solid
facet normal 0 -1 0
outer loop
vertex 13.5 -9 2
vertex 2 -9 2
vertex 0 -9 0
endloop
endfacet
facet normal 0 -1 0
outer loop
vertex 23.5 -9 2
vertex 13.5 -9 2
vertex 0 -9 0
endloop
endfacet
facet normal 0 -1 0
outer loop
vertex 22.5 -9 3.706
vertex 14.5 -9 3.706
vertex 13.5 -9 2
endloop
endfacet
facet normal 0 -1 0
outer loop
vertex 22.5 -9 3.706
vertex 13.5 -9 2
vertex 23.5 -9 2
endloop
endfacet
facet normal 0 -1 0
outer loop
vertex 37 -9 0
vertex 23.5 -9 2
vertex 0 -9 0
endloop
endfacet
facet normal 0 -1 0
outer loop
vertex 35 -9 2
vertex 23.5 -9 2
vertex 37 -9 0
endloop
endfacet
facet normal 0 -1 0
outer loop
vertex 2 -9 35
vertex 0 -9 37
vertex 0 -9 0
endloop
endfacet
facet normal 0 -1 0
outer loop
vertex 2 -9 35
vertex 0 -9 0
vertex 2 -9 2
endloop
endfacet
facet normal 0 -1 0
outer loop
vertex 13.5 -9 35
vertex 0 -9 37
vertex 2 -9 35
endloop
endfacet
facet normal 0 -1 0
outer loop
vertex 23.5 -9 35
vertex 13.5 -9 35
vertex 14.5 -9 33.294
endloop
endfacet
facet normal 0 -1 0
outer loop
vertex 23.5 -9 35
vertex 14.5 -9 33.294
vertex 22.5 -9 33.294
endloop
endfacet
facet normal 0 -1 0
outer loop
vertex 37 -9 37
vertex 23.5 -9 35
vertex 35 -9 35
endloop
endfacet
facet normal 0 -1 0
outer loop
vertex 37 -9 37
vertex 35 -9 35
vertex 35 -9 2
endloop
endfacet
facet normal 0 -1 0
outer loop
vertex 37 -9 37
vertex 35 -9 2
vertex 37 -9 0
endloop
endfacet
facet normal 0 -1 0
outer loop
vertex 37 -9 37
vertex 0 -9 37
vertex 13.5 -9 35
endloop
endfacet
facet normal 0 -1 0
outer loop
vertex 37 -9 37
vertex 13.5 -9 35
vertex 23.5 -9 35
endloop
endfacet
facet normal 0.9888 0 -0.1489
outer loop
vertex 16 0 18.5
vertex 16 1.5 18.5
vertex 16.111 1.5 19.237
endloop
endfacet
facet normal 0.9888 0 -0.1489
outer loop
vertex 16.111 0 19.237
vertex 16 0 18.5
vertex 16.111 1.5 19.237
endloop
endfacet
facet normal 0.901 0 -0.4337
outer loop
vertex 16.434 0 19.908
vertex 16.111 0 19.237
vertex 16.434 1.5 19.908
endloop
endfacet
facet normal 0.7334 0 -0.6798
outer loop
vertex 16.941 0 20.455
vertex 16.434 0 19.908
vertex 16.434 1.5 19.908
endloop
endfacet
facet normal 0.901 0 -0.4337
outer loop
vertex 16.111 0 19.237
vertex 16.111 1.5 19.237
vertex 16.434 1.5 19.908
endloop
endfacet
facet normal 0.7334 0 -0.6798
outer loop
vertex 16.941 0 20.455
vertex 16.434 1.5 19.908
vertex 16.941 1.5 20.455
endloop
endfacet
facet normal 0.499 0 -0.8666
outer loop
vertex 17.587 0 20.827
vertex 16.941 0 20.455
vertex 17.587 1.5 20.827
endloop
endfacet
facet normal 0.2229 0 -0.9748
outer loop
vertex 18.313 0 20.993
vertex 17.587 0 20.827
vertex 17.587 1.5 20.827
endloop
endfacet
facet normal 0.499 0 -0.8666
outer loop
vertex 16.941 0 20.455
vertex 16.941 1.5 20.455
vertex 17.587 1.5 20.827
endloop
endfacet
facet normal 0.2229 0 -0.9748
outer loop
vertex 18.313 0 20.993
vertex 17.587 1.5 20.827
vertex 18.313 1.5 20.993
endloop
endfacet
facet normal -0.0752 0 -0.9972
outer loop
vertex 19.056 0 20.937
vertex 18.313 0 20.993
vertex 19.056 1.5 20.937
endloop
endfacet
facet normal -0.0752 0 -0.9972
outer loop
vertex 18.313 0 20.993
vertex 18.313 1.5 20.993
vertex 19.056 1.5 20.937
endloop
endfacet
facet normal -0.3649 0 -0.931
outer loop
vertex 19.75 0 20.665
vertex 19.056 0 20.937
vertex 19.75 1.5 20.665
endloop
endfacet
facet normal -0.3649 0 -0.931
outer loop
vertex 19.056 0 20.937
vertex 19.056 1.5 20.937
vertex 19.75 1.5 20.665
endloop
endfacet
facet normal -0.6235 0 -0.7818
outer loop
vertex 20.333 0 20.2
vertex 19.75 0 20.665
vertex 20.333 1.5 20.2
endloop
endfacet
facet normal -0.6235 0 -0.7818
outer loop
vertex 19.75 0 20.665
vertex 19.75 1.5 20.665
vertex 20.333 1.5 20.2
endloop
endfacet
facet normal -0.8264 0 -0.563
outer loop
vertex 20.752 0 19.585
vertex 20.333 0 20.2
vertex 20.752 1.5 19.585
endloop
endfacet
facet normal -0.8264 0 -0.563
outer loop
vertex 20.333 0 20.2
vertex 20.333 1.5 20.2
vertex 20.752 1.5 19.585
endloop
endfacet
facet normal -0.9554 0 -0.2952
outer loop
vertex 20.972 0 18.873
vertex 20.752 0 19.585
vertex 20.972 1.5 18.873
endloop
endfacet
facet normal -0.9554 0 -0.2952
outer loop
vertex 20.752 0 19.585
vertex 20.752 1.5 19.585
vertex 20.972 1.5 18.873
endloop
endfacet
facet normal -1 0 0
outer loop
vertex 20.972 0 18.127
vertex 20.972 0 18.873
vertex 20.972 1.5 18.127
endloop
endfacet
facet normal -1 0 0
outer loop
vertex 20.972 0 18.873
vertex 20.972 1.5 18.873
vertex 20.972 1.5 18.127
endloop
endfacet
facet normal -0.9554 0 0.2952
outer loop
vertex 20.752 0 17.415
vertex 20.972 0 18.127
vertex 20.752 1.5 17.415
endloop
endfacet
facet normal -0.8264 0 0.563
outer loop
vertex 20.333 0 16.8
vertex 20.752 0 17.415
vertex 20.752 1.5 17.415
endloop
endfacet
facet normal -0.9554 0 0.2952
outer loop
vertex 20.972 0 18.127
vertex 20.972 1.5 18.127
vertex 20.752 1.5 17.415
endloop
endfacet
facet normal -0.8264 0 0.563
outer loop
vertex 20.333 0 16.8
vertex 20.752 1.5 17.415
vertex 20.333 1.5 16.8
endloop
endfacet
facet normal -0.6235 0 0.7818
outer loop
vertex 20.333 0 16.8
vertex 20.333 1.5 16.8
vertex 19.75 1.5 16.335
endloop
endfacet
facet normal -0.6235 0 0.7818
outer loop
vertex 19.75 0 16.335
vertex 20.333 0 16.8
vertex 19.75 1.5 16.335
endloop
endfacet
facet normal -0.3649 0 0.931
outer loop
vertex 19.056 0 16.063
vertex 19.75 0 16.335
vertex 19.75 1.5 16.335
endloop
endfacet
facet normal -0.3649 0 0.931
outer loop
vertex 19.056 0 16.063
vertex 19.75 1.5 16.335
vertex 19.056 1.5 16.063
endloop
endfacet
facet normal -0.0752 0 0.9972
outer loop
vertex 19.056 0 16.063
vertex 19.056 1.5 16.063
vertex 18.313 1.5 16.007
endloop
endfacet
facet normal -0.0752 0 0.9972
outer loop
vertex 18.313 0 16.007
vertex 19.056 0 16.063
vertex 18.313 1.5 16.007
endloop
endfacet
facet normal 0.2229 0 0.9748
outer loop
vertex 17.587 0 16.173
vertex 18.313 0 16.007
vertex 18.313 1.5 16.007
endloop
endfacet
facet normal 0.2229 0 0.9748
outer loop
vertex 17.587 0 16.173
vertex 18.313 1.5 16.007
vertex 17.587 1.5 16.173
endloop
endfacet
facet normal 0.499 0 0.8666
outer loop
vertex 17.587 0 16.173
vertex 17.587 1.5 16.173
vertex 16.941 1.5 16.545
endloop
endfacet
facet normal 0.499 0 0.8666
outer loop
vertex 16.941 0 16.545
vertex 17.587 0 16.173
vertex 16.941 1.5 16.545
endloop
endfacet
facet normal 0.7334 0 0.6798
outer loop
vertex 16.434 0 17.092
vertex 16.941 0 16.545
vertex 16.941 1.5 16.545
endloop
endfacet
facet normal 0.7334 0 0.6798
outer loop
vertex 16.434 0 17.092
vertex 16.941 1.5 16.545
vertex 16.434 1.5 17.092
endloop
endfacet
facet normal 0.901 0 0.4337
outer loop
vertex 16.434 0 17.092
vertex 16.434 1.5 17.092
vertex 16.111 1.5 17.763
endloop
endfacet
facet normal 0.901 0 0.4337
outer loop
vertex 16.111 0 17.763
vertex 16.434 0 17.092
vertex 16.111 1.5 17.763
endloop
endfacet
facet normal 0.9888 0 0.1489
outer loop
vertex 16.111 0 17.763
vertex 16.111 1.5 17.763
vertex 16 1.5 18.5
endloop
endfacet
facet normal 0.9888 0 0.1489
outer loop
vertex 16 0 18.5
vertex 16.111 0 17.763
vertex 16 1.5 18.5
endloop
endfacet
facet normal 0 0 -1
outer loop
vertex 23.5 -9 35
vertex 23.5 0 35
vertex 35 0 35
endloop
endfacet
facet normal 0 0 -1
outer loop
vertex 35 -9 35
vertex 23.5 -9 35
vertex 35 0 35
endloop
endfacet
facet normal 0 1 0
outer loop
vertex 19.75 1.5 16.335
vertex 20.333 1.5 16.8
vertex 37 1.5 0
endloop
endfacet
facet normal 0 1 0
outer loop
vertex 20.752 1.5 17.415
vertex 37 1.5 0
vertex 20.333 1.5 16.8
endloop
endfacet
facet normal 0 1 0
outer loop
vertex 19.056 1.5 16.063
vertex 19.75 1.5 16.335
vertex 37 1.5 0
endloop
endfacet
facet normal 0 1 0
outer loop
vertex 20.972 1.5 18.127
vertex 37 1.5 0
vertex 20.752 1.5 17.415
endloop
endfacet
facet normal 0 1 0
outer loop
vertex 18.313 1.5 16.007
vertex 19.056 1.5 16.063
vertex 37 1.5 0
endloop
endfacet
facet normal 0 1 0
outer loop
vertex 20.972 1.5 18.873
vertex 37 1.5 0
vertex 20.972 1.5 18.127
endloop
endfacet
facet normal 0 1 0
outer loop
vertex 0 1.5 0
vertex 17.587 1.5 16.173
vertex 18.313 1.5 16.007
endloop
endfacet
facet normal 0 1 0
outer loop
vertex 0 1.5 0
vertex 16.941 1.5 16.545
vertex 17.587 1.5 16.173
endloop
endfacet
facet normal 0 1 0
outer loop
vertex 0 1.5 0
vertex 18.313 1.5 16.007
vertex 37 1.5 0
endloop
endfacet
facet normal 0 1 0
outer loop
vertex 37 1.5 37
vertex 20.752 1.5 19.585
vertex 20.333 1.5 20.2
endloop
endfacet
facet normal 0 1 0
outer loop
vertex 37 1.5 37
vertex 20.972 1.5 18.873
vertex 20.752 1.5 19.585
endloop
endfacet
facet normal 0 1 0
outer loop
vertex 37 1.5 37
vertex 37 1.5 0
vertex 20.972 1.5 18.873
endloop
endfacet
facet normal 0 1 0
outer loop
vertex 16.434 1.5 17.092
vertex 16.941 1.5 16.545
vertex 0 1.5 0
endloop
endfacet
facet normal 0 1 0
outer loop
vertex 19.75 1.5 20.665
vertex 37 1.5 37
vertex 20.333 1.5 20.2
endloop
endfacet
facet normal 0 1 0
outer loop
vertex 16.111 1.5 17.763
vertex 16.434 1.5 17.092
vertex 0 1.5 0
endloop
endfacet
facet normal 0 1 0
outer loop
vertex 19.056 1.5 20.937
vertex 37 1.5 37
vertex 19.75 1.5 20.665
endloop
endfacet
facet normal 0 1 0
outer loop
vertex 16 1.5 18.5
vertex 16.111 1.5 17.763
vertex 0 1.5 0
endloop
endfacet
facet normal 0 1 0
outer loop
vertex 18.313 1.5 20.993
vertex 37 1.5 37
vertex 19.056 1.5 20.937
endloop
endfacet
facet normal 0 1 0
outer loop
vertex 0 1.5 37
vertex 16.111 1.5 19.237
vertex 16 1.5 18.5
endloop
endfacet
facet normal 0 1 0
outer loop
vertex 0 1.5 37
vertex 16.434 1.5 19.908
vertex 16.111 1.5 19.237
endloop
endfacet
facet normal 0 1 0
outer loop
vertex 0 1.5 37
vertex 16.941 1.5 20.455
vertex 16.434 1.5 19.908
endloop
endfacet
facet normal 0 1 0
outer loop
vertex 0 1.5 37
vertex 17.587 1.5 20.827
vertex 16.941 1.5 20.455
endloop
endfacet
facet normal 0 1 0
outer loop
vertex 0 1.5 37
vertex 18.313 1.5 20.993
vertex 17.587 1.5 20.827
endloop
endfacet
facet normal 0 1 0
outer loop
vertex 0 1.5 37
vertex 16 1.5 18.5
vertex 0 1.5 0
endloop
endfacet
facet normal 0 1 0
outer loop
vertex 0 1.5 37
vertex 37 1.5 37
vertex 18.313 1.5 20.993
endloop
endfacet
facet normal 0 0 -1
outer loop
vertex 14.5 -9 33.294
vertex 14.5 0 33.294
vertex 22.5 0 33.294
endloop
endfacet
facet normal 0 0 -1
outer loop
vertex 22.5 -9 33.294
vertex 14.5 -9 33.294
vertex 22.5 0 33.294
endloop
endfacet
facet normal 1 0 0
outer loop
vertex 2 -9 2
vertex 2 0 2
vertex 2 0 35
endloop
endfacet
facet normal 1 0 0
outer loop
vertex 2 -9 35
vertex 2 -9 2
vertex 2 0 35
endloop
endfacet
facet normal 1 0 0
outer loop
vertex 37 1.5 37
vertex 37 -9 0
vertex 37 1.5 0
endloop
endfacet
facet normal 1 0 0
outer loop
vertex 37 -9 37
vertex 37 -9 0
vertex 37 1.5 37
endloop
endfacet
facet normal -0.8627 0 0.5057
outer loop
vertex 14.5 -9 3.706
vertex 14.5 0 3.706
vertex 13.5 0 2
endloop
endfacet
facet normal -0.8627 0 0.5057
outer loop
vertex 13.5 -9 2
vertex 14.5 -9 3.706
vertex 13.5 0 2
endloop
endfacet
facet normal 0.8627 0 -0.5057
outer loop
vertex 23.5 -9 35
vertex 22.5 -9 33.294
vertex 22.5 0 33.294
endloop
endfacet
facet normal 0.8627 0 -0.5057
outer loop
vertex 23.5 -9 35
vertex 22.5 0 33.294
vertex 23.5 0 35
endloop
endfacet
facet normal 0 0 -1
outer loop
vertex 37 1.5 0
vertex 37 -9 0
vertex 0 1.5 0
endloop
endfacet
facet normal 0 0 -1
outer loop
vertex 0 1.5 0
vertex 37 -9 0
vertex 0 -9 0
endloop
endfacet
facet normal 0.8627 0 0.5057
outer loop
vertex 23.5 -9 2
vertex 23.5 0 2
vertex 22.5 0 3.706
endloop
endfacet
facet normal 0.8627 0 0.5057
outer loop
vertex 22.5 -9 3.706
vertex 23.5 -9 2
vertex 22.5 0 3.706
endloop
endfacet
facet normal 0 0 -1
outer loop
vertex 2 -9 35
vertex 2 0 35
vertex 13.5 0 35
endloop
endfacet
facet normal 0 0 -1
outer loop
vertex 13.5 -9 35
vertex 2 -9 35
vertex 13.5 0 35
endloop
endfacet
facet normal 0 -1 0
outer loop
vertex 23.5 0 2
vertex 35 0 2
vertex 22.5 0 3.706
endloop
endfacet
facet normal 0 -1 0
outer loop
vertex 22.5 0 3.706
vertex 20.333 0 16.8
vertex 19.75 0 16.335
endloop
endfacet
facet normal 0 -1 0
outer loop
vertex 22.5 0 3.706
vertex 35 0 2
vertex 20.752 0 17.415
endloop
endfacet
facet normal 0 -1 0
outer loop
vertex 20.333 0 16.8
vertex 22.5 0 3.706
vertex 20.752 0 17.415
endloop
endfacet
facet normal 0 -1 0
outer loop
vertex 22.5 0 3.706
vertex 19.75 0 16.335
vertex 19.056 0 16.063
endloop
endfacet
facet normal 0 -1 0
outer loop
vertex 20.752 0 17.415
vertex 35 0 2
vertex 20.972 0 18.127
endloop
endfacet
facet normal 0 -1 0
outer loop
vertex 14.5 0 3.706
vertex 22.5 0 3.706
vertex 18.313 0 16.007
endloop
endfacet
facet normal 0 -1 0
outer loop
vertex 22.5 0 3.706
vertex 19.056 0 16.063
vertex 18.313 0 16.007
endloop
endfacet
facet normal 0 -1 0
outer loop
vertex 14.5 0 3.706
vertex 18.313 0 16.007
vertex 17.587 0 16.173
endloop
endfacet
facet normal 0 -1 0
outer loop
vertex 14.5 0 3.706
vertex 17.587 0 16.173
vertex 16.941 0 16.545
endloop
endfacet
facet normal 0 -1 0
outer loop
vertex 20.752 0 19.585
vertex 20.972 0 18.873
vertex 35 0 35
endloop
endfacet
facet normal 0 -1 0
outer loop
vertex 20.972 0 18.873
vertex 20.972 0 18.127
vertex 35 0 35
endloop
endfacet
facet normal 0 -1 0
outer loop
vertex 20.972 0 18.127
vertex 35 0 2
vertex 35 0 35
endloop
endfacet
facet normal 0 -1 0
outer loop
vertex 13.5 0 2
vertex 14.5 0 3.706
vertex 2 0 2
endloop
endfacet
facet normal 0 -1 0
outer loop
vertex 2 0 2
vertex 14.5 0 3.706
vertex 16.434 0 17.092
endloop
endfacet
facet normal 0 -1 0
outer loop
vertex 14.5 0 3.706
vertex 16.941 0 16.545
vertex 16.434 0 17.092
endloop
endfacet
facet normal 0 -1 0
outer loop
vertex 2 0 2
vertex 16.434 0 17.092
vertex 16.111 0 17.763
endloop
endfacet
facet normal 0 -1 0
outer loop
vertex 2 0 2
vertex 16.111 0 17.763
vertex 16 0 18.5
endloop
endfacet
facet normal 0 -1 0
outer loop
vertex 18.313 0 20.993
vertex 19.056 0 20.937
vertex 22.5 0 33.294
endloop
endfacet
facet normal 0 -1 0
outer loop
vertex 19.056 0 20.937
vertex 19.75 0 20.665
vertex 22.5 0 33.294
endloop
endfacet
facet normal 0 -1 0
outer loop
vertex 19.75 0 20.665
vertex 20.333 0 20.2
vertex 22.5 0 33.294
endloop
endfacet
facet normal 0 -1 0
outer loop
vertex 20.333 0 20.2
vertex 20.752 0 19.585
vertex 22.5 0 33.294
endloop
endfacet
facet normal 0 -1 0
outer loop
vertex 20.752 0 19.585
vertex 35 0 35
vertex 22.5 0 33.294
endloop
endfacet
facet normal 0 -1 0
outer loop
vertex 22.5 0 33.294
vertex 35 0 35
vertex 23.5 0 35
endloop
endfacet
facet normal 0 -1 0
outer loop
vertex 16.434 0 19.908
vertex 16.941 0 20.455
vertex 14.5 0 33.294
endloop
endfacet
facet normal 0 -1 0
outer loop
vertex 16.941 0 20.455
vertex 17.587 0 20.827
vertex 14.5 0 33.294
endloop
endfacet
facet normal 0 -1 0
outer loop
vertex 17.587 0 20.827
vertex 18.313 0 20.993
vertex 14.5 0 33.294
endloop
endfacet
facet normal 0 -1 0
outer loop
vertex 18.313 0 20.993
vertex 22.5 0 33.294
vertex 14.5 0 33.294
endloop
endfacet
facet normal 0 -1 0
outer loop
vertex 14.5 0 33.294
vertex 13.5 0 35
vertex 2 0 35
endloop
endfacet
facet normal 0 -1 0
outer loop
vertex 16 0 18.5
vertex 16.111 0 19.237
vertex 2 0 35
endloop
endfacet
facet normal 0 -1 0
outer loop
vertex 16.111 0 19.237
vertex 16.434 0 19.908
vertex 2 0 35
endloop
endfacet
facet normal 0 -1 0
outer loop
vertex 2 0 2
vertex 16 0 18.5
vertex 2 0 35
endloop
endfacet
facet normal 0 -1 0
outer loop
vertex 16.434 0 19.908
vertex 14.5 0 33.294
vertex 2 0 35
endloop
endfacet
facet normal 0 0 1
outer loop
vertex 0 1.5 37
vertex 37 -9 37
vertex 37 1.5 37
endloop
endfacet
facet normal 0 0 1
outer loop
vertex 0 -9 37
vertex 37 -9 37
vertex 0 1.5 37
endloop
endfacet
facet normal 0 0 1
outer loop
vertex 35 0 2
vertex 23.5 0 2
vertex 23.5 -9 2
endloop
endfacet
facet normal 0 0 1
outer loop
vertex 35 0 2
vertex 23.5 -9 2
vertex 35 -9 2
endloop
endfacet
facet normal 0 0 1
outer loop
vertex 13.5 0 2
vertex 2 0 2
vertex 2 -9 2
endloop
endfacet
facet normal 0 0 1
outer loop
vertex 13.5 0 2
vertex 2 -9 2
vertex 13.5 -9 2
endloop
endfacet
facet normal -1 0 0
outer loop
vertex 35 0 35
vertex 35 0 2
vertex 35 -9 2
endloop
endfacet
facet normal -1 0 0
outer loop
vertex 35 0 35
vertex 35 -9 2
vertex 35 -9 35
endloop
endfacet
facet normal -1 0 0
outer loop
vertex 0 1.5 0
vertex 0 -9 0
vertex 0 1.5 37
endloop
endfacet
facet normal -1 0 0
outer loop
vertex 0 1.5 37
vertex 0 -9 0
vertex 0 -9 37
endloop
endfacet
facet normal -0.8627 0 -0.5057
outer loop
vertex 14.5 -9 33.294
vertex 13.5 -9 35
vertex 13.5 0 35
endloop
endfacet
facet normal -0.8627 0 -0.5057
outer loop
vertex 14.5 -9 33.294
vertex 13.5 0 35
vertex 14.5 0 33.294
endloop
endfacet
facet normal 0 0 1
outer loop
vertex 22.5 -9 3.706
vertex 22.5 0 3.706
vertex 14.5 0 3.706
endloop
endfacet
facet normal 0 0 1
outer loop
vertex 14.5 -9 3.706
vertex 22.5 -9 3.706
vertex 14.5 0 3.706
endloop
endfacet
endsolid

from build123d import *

# Parameters (mm, degrees)
F0_W     = 37
F0_H     = 37
F0_W_2   = 33
F0_H_2   = 33
F1_DEPTH = 9
F2_W     = 37
F2_H     = 37
F3_DEPTH = 1.5
F5_DEPTH = 9
F7_D     = 5


with BuildPart() as f1:
    # F0 (on Front) → F1 (new body)
    with BuildSketch(Plane.XZ):
        with Locations((18.5, 18.5)):
            Rectangle(F0_W, F0_H)
        with Locations((18.5, 18.5)):
            Rectangle(F0_W_2, F0_H_2, mode=Mode.SUBTRACT)
    extrude(amount=F1_DEPTH)

    # F2 (on face) → F3 (join)
    with BuildSketch(Plane(origin=(0, 0, 0), x_dir=(-1, 0, 0), z_dir=(0, 1, 0))):
        with Locations((-18.5, 18.5)):
            Rectangle(F2_W, F2_H)
    extrude(amount=F3_DEPTH)

    # F4 (on face) → F5 (join, through all)
    with BuildSketch(Plane.XZ.offset(9)):
        Polygon((23.5, 35), (13.5, 35), (14.5, 33.294015), (22.5, 33.294015), align=None)
        Polygon((14.5, 3.705985), (13.5, 2), (23.5, 2), (22.5, 3.705985), align=None)
    extrude(amount=-F5_DEPTH)

    # F7 (through all)
    with Locations(Plane.XZ):
        with Locations((18.5, 18.5)):
            Hole(F7_D / 2)


solid = f1.part
